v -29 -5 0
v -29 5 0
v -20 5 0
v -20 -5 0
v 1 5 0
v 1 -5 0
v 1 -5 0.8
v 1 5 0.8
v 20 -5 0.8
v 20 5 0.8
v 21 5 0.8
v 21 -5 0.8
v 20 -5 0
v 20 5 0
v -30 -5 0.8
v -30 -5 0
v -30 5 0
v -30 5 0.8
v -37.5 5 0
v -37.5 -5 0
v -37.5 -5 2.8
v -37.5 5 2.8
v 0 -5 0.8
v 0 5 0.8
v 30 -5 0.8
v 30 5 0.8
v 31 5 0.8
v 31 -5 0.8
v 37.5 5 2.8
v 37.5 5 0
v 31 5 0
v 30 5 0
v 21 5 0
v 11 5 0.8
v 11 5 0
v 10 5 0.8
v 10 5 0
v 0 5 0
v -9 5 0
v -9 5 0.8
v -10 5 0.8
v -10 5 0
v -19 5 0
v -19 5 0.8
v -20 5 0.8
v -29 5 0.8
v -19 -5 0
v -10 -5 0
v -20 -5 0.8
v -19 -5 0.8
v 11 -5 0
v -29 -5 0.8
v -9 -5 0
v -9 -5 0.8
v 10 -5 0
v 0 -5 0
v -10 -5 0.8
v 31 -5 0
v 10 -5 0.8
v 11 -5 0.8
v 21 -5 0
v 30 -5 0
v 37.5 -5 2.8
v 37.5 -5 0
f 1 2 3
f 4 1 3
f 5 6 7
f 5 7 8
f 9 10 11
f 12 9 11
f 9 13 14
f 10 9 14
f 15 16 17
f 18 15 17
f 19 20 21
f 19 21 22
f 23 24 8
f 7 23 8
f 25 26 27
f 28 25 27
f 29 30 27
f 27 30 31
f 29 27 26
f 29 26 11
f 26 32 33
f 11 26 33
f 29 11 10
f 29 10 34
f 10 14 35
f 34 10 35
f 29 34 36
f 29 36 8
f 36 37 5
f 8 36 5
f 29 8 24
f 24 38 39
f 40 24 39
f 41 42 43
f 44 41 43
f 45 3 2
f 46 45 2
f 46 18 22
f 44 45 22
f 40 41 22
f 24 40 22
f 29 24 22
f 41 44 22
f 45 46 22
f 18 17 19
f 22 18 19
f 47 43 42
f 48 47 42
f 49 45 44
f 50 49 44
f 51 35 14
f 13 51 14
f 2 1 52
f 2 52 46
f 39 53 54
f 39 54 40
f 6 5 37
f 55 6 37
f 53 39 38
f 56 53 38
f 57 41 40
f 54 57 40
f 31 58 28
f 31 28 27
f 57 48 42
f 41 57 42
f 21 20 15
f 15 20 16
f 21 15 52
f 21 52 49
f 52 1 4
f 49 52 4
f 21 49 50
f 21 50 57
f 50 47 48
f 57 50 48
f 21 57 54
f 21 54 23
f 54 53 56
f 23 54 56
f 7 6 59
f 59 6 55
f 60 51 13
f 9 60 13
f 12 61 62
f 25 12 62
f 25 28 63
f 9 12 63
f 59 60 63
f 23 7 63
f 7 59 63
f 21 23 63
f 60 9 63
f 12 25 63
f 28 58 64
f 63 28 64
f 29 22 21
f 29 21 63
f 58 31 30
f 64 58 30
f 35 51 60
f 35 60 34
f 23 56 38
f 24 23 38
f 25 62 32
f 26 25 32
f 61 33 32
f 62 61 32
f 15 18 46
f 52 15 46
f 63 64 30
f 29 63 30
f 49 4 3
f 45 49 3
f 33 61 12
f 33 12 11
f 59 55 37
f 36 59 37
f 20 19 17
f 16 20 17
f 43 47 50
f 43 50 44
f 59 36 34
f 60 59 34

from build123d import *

# Parameters (mm, degrees)
F0_W     = 9
F0_H     = 10
F0_W_2   = 1
F0_W_3   = 6.5
F0_W_4   = 7.5
F1_DEPTH = 2.8
F2_DEPTH = 0.8


with BuildPart() as f1:
    # F0 (on Top) → F1 (new body)
    with BuildSketch(Plane.XY):
        with Locations((-24.5, 0)):
            Rectangle(F0_W, F0_H)
        with Locations((-29.5, 0)):
            Rectangle(F0_W_2, F0_H)
        with Locations((34.25, 0)):
            Rectangle(F0_W_3, F0_H)
        with Locations((-33.75, 0)):
            Rectangle(F0_W_4, F0_H)
        with Locations((30.5, 0)):
            Rectangle(F0_W_2, F0_H)
        with Locations((25.5, 0)):
            Rectangle(F0_W, F0_H)
        with Locations((20.5, 0)):
            Rectangle(F0_W_2, F0_H)
        with Locations((15.5, 0)):
            Rectangle(F0_W, F0_H)
        with Locations((10.5, 0)):
            Rectangle(F0_W_2, F0_H)
        with Locations((5.5, 0)):
            Rectangle(F0_W, F0_H)
        with Locations((0.5, 0)):
            Rectangle(F0_W_2, F0_H)
        with Locations((-4.5, 0)):
            Rectangle(F0_W, F0_H)
        with Locations((-9.5, 0)):
            Rectangle(F0_W_2, F0_H)
        with Locations((-14.5, 0)):
            Rectangle(F0_W, F0_H)
        with Locations((-19.5, 0)):
            Rectangle(F0_W_2, F0_H)
    extrude(amount=F1_DEPTH)

    # F0 (on Top) → F2 (cut)
    with BuildSketch(Plane.XY):
        with Locations((-29.5, 0)):
            Rectangle(F0_W_2, F0_H)
        with Locations((-19.5, 0)):
            Rectangle(F0_W_2, F0_H)
        with Locations((-9.5, 0)):
            Rectangle(F0_W_2, F0_H)
        with Locations((0.5, 0)):
            Rectangle(F0_W_2, F0_H)
        with Locations((10.5, 0)):
            Rectangle(F0_W_2, F0_H)
        with Locations((20.5, 0)):
            Rectangle(F0_W_2, F0_H)
        with Locations((30.5, 0)):
            Rectangle(F0_W_2, F0_H)
    extrude(amount=F2_DEPTH, mode=Mode.SUBTRACT)


solid = f1.part
